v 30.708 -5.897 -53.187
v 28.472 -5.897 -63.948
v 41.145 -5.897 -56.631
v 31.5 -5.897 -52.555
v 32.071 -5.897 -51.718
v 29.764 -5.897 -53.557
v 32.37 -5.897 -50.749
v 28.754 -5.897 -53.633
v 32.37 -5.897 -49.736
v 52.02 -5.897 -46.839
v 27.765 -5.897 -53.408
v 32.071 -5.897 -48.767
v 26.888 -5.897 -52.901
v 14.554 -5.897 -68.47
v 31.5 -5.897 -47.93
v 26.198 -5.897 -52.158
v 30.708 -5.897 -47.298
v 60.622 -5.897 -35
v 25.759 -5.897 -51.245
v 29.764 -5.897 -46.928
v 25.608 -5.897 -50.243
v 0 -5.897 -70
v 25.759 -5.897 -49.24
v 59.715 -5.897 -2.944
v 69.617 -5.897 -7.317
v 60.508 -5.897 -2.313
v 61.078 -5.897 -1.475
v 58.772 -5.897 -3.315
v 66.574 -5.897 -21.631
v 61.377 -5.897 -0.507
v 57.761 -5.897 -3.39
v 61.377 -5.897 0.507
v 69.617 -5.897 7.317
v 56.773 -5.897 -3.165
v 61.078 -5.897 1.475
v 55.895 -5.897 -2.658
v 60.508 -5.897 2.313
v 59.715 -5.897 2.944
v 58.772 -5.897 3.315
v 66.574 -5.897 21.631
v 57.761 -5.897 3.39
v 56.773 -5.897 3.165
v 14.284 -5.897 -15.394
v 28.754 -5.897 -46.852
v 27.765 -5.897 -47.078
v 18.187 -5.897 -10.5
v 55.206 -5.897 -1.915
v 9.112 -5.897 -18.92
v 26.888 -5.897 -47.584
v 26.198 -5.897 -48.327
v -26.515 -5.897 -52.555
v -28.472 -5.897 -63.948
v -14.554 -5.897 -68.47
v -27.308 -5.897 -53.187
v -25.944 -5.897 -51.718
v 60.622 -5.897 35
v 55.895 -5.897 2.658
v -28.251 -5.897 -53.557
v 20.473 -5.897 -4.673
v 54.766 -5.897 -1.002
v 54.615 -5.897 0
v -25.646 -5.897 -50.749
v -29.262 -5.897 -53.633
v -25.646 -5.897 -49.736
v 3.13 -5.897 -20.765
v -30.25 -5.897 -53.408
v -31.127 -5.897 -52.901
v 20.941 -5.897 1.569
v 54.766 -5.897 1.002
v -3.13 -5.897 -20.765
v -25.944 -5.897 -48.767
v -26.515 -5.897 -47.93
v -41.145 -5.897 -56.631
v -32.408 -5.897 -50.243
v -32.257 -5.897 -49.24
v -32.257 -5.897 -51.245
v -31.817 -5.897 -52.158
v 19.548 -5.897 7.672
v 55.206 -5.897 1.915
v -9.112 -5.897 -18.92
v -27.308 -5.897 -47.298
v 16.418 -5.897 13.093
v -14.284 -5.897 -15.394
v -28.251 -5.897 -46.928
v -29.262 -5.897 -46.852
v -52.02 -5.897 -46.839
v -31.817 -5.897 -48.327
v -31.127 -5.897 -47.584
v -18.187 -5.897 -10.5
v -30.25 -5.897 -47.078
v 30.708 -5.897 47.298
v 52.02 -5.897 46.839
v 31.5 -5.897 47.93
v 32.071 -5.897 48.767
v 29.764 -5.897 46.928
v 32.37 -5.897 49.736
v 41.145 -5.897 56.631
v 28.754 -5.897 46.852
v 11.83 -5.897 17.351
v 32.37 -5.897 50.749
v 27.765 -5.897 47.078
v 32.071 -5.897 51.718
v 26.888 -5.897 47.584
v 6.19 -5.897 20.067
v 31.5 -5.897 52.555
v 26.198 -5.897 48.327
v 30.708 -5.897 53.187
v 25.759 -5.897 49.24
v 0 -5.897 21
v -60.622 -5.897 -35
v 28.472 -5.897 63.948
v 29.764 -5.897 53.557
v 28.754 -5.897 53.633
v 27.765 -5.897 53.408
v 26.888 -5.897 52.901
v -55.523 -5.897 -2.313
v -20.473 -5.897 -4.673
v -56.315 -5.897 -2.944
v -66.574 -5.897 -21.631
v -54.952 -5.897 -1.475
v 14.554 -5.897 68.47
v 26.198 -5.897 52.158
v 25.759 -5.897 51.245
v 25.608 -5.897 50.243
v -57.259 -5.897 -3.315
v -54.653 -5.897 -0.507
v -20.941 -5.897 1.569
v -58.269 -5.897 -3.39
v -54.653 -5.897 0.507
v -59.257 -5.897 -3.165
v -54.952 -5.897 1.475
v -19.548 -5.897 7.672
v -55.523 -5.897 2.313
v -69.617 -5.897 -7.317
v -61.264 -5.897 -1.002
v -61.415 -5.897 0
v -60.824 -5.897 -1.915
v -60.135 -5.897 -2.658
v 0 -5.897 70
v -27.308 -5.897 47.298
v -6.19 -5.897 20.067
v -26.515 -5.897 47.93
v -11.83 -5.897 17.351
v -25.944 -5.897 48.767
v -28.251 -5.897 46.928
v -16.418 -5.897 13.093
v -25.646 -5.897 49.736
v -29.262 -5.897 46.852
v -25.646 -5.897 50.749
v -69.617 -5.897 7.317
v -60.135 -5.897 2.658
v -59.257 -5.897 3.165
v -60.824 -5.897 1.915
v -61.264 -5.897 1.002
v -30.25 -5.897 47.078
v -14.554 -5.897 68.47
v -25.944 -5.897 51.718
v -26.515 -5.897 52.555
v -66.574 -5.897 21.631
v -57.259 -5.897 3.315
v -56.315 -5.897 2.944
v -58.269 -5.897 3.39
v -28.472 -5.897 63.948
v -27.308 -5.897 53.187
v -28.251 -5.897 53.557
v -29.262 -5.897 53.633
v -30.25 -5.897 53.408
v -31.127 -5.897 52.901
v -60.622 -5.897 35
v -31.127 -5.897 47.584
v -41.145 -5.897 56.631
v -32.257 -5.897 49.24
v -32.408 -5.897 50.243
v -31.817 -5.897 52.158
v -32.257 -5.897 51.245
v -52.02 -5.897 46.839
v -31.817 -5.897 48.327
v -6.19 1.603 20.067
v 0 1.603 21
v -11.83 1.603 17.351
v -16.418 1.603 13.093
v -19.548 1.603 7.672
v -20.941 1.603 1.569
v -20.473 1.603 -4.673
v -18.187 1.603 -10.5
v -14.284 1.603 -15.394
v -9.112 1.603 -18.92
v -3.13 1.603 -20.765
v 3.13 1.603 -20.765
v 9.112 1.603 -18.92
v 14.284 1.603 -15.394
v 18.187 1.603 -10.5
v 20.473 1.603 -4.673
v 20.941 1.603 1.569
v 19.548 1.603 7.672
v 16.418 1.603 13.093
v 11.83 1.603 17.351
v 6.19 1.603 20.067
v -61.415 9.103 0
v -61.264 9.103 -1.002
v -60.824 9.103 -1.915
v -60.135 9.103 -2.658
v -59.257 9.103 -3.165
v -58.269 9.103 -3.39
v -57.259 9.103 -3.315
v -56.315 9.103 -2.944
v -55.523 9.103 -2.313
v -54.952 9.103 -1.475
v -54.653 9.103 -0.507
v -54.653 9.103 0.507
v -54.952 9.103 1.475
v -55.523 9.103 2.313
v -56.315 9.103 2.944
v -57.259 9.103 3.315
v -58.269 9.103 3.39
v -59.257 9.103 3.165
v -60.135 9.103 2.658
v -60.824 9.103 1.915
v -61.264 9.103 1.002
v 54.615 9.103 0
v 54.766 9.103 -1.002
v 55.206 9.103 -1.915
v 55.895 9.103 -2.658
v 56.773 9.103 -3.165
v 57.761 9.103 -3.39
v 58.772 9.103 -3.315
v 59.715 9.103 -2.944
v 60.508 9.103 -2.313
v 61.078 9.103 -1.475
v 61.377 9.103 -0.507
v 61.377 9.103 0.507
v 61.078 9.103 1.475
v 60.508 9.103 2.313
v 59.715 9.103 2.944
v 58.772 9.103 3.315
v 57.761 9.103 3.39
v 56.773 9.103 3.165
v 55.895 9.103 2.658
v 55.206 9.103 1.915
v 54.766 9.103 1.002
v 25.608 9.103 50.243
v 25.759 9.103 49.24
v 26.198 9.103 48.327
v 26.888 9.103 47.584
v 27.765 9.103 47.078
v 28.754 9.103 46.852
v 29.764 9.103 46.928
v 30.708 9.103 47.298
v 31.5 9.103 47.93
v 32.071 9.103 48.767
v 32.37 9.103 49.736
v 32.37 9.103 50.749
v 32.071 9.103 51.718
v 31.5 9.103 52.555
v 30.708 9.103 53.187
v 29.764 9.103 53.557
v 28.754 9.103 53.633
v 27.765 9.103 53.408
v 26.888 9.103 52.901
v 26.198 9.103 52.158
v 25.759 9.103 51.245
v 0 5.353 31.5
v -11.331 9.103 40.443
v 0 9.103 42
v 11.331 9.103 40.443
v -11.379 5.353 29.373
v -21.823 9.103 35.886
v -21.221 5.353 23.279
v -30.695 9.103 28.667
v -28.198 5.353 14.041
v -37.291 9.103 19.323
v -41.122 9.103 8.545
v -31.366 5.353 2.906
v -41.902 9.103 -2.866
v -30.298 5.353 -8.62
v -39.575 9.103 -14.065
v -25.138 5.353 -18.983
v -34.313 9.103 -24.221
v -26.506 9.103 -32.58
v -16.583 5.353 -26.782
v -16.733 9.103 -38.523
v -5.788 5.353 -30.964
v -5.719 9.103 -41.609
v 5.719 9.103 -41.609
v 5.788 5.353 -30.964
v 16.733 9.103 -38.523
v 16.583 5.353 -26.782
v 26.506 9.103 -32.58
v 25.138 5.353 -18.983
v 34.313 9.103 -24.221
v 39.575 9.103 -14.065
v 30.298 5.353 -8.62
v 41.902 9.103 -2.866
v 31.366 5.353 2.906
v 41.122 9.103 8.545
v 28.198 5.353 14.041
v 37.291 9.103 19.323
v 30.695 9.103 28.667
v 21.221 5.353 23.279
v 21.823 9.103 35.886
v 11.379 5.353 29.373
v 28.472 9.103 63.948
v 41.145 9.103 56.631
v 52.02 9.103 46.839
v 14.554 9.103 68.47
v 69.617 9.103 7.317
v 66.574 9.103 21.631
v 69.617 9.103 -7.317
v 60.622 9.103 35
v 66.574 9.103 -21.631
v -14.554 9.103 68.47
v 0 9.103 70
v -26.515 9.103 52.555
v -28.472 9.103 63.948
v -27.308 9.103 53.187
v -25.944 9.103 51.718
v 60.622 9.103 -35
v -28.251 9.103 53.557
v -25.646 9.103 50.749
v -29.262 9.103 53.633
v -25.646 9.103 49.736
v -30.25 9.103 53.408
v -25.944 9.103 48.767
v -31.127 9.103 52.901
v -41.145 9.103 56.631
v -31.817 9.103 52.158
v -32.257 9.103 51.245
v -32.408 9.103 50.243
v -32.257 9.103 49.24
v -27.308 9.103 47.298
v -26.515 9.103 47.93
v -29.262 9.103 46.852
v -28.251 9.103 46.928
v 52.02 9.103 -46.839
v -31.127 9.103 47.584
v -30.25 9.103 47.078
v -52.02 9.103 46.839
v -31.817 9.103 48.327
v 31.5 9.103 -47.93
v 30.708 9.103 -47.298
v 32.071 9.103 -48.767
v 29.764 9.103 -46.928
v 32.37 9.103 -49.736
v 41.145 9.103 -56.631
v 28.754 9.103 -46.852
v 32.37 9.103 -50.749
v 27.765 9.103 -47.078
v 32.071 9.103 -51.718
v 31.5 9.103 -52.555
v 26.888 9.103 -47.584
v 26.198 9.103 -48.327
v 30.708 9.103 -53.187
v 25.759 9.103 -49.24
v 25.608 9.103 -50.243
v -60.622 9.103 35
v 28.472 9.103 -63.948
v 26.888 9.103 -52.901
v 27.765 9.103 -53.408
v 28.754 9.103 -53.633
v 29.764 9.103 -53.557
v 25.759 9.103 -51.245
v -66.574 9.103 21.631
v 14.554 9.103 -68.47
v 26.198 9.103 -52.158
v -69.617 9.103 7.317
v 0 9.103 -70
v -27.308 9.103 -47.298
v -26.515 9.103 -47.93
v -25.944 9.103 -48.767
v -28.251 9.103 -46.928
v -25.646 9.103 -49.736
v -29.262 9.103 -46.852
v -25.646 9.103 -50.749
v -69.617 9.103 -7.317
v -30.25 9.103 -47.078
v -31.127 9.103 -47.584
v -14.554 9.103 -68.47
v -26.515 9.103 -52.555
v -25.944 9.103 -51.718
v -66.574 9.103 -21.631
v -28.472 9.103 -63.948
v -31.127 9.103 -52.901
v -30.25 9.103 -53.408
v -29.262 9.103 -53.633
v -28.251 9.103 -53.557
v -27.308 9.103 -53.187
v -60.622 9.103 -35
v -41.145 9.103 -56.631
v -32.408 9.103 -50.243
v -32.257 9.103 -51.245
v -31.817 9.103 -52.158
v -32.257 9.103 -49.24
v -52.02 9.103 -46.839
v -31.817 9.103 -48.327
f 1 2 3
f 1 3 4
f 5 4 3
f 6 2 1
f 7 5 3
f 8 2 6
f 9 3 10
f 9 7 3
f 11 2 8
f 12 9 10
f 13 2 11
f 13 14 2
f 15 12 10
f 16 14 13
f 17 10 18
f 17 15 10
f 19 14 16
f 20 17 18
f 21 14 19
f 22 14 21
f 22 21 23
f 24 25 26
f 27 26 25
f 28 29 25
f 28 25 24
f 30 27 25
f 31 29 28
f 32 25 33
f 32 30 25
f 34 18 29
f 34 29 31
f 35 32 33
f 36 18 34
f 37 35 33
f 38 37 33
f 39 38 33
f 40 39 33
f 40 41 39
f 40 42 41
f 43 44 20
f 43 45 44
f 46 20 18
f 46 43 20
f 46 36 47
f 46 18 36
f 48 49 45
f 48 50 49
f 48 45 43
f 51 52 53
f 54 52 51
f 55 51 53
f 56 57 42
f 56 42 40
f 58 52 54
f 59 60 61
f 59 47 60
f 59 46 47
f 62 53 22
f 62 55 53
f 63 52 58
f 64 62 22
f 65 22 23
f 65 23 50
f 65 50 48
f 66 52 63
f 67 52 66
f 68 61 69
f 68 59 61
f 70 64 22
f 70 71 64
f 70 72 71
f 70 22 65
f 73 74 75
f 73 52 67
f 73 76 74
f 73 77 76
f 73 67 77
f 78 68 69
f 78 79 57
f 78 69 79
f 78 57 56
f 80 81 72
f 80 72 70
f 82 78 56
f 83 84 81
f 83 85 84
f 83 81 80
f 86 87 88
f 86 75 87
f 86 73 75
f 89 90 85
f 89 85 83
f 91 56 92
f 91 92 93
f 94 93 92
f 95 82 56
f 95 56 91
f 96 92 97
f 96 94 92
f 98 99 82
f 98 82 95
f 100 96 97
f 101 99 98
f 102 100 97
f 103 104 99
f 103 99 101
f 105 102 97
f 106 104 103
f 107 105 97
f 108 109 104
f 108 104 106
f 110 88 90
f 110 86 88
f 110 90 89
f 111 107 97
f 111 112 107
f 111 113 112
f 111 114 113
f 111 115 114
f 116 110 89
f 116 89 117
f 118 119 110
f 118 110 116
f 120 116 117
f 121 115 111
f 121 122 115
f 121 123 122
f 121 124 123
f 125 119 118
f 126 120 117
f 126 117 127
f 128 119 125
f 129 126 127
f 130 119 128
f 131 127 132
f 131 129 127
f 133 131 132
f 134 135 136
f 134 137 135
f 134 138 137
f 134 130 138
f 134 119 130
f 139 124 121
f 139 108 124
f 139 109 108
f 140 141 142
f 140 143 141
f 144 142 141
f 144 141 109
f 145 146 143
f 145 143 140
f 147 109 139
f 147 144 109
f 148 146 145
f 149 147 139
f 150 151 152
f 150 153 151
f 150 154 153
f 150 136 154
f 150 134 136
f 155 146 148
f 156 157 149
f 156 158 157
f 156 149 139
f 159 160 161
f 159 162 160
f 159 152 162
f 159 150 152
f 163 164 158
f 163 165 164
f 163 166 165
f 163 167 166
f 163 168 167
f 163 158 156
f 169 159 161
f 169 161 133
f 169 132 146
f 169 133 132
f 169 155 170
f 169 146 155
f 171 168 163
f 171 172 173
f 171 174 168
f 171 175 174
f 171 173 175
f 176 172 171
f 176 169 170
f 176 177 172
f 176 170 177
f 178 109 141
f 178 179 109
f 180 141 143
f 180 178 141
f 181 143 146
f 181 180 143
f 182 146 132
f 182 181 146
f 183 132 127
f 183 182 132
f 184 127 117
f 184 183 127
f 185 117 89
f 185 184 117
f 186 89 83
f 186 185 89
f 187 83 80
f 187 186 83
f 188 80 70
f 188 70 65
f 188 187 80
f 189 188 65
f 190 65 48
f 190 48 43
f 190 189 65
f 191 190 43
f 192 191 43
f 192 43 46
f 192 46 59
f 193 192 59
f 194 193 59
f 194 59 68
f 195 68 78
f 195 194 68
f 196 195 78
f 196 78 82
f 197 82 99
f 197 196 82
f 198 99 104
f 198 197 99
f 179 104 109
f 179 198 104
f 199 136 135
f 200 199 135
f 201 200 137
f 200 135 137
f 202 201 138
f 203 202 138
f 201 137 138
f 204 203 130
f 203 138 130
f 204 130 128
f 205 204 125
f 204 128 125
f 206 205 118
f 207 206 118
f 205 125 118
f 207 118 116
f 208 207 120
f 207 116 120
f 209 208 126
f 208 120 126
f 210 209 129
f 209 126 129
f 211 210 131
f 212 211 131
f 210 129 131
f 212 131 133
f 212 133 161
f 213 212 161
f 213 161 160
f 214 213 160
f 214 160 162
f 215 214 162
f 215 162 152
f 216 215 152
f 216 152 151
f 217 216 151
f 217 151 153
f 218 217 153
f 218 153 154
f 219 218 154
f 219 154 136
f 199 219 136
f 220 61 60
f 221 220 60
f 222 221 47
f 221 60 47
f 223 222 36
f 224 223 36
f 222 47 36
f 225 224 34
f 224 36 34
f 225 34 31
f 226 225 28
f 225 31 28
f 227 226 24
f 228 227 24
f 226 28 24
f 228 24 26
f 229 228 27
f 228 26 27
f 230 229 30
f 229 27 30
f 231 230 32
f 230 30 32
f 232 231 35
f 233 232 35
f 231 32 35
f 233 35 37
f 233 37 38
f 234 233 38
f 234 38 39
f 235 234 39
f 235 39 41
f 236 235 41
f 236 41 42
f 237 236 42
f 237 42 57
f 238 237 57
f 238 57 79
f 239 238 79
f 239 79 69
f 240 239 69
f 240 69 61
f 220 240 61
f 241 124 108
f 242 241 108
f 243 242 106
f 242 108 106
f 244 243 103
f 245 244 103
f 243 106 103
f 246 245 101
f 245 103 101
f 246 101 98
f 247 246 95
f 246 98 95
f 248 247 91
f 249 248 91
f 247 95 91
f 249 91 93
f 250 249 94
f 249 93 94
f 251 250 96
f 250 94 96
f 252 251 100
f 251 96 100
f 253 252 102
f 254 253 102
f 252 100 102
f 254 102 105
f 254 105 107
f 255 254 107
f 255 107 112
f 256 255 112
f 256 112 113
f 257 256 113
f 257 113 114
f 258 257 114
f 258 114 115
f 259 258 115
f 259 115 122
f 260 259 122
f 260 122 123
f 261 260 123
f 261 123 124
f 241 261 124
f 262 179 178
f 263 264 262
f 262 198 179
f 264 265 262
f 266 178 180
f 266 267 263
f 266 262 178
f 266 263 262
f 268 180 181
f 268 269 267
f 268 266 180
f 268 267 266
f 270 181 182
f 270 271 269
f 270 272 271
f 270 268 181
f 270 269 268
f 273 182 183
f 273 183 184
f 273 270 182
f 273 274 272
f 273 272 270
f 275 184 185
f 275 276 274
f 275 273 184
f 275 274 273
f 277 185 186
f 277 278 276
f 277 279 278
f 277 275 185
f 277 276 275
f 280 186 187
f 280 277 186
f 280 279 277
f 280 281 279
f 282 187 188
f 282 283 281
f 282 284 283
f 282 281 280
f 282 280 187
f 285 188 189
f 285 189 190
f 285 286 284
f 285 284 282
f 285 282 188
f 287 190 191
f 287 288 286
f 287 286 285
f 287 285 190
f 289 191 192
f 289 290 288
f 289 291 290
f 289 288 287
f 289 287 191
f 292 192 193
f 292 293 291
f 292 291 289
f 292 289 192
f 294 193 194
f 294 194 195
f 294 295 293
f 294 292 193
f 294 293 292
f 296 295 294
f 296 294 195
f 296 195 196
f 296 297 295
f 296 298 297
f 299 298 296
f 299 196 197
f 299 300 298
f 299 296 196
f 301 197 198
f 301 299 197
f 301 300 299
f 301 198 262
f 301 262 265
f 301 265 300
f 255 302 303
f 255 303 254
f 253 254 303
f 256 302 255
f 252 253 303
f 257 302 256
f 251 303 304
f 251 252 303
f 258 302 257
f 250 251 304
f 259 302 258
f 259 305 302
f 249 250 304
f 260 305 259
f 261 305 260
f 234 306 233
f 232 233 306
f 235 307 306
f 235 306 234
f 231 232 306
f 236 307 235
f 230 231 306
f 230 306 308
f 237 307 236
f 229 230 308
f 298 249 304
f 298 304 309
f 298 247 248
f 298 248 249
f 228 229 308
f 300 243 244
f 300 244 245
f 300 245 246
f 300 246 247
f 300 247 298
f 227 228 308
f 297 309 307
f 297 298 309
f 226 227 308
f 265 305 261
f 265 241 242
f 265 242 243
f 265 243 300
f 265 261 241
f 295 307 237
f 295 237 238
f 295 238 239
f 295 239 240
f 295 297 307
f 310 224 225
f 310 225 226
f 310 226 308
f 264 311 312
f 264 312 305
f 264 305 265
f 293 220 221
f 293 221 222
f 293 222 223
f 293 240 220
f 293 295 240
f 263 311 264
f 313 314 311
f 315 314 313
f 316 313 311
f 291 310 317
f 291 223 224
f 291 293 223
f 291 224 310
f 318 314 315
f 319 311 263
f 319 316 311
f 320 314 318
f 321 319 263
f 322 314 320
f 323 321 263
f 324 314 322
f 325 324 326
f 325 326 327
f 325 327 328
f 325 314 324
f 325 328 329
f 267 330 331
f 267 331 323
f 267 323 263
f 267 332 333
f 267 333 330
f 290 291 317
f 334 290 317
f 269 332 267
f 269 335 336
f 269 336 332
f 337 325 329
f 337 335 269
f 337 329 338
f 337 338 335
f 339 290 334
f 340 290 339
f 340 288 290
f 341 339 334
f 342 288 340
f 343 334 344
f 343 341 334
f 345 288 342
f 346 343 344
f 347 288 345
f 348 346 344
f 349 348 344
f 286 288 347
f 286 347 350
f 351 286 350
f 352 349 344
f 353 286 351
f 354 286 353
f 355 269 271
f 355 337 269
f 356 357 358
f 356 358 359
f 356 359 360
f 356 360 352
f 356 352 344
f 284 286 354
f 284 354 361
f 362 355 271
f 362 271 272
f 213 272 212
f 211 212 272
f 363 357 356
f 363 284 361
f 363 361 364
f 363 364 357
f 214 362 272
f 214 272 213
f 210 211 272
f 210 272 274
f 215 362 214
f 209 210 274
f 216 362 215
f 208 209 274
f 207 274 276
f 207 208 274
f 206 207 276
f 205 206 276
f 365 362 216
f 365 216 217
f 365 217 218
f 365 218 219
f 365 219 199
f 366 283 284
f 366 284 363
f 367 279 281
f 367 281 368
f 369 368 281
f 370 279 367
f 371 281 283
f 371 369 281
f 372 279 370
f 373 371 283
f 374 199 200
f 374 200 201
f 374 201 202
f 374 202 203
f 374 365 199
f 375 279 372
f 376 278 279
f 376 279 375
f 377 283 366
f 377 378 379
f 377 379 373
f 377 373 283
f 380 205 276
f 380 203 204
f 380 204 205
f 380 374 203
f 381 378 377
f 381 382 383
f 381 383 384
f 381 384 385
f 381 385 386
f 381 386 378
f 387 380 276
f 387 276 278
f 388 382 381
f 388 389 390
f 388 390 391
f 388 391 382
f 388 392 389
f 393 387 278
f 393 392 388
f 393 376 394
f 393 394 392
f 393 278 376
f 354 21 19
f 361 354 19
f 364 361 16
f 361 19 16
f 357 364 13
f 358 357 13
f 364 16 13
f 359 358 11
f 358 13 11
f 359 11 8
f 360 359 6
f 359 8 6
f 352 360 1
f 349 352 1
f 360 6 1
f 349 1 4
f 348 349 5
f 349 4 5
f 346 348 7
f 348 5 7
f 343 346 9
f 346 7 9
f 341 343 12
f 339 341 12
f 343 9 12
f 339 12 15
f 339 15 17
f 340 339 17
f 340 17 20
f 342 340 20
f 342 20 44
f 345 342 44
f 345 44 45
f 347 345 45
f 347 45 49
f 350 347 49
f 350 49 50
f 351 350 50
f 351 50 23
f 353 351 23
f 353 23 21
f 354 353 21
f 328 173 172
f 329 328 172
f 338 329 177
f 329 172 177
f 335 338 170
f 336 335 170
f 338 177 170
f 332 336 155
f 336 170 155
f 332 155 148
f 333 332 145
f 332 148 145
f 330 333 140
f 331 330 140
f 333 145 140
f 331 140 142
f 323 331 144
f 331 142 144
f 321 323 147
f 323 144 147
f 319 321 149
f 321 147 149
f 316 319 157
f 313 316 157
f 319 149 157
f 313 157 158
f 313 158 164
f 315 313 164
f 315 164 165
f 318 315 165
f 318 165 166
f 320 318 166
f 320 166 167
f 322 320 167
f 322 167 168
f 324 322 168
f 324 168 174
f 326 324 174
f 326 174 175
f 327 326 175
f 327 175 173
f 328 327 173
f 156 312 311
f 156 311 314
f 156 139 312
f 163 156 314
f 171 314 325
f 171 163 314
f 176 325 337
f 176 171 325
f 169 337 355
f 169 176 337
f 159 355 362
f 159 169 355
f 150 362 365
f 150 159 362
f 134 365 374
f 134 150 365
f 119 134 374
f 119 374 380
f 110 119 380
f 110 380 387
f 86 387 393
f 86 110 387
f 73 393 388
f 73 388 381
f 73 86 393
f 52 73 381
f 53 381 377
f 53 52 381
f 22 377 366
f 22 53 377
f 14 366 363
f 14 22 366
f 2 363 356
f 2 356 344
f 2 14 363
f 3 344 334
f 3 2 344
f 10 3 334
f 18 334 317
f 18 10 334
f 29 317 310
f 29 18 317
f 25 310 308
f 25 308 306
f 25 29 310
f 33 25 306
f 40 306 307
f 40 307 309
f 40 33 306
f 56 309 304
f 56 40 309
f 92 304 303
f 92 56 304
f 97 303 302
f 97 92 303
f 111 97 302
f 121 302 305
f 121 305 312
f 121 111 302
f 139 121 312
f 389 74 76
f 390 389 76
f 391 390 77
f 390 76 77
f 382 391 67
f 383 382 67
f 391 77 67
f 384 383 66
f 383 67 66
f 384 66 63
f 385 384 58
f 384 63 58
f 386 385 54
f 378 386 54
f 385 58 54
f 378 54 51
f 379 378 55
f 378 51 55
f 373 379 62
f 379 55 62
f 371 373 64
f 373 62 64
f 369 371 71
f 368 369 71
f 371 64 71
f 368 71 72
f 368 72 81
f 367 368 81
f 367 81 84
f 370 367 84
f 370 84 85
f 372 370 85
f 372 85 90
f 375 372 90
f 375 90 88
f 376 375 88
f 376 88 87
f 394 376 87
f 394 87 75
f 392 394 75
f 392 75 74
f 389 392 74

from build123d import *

# Parameters (mm, degrees)
OTW_R_GWINTOWANY_M81_D = 6.8


with BuildPart() as part:
    # Szkic1 → Obrót1 (revolve)
    with BuildSketch(Plane.XY, mode=Mode.PRIVATE) as obr_t1_sk:
        Polygon((-70, 9.103065775), (-70, -5.896934225), (-21, -5.896934225), (-21, 1.603065775), (-42, 9.103065775), align=None)
    revolve(obr_t1_sk.sketch.rotate(Axis((0, 48.980657748, 0), (0, -1, 0)), 270), axis=Axis((0, 48.980657748, 0), (0, -1, 0)))

    # Otwór gwintowany M81 (through all)
    with Locations(Plane(origin=(0, 9.103065775, 0), x_dir=(1, 0, 0), z_dir=(0, 1, 0))):
        with Locations((-58.015165068, 0), (-29.007582534, 50.242606754), (29.007582534, 50.242606754), (58.015165068, 0), (29.007582534, -50.242606754), (-29.007582534, -50.242606754)):
            Hole(OTW_R_GWINTOWANY_M81_D / 2)


solid = part.part
